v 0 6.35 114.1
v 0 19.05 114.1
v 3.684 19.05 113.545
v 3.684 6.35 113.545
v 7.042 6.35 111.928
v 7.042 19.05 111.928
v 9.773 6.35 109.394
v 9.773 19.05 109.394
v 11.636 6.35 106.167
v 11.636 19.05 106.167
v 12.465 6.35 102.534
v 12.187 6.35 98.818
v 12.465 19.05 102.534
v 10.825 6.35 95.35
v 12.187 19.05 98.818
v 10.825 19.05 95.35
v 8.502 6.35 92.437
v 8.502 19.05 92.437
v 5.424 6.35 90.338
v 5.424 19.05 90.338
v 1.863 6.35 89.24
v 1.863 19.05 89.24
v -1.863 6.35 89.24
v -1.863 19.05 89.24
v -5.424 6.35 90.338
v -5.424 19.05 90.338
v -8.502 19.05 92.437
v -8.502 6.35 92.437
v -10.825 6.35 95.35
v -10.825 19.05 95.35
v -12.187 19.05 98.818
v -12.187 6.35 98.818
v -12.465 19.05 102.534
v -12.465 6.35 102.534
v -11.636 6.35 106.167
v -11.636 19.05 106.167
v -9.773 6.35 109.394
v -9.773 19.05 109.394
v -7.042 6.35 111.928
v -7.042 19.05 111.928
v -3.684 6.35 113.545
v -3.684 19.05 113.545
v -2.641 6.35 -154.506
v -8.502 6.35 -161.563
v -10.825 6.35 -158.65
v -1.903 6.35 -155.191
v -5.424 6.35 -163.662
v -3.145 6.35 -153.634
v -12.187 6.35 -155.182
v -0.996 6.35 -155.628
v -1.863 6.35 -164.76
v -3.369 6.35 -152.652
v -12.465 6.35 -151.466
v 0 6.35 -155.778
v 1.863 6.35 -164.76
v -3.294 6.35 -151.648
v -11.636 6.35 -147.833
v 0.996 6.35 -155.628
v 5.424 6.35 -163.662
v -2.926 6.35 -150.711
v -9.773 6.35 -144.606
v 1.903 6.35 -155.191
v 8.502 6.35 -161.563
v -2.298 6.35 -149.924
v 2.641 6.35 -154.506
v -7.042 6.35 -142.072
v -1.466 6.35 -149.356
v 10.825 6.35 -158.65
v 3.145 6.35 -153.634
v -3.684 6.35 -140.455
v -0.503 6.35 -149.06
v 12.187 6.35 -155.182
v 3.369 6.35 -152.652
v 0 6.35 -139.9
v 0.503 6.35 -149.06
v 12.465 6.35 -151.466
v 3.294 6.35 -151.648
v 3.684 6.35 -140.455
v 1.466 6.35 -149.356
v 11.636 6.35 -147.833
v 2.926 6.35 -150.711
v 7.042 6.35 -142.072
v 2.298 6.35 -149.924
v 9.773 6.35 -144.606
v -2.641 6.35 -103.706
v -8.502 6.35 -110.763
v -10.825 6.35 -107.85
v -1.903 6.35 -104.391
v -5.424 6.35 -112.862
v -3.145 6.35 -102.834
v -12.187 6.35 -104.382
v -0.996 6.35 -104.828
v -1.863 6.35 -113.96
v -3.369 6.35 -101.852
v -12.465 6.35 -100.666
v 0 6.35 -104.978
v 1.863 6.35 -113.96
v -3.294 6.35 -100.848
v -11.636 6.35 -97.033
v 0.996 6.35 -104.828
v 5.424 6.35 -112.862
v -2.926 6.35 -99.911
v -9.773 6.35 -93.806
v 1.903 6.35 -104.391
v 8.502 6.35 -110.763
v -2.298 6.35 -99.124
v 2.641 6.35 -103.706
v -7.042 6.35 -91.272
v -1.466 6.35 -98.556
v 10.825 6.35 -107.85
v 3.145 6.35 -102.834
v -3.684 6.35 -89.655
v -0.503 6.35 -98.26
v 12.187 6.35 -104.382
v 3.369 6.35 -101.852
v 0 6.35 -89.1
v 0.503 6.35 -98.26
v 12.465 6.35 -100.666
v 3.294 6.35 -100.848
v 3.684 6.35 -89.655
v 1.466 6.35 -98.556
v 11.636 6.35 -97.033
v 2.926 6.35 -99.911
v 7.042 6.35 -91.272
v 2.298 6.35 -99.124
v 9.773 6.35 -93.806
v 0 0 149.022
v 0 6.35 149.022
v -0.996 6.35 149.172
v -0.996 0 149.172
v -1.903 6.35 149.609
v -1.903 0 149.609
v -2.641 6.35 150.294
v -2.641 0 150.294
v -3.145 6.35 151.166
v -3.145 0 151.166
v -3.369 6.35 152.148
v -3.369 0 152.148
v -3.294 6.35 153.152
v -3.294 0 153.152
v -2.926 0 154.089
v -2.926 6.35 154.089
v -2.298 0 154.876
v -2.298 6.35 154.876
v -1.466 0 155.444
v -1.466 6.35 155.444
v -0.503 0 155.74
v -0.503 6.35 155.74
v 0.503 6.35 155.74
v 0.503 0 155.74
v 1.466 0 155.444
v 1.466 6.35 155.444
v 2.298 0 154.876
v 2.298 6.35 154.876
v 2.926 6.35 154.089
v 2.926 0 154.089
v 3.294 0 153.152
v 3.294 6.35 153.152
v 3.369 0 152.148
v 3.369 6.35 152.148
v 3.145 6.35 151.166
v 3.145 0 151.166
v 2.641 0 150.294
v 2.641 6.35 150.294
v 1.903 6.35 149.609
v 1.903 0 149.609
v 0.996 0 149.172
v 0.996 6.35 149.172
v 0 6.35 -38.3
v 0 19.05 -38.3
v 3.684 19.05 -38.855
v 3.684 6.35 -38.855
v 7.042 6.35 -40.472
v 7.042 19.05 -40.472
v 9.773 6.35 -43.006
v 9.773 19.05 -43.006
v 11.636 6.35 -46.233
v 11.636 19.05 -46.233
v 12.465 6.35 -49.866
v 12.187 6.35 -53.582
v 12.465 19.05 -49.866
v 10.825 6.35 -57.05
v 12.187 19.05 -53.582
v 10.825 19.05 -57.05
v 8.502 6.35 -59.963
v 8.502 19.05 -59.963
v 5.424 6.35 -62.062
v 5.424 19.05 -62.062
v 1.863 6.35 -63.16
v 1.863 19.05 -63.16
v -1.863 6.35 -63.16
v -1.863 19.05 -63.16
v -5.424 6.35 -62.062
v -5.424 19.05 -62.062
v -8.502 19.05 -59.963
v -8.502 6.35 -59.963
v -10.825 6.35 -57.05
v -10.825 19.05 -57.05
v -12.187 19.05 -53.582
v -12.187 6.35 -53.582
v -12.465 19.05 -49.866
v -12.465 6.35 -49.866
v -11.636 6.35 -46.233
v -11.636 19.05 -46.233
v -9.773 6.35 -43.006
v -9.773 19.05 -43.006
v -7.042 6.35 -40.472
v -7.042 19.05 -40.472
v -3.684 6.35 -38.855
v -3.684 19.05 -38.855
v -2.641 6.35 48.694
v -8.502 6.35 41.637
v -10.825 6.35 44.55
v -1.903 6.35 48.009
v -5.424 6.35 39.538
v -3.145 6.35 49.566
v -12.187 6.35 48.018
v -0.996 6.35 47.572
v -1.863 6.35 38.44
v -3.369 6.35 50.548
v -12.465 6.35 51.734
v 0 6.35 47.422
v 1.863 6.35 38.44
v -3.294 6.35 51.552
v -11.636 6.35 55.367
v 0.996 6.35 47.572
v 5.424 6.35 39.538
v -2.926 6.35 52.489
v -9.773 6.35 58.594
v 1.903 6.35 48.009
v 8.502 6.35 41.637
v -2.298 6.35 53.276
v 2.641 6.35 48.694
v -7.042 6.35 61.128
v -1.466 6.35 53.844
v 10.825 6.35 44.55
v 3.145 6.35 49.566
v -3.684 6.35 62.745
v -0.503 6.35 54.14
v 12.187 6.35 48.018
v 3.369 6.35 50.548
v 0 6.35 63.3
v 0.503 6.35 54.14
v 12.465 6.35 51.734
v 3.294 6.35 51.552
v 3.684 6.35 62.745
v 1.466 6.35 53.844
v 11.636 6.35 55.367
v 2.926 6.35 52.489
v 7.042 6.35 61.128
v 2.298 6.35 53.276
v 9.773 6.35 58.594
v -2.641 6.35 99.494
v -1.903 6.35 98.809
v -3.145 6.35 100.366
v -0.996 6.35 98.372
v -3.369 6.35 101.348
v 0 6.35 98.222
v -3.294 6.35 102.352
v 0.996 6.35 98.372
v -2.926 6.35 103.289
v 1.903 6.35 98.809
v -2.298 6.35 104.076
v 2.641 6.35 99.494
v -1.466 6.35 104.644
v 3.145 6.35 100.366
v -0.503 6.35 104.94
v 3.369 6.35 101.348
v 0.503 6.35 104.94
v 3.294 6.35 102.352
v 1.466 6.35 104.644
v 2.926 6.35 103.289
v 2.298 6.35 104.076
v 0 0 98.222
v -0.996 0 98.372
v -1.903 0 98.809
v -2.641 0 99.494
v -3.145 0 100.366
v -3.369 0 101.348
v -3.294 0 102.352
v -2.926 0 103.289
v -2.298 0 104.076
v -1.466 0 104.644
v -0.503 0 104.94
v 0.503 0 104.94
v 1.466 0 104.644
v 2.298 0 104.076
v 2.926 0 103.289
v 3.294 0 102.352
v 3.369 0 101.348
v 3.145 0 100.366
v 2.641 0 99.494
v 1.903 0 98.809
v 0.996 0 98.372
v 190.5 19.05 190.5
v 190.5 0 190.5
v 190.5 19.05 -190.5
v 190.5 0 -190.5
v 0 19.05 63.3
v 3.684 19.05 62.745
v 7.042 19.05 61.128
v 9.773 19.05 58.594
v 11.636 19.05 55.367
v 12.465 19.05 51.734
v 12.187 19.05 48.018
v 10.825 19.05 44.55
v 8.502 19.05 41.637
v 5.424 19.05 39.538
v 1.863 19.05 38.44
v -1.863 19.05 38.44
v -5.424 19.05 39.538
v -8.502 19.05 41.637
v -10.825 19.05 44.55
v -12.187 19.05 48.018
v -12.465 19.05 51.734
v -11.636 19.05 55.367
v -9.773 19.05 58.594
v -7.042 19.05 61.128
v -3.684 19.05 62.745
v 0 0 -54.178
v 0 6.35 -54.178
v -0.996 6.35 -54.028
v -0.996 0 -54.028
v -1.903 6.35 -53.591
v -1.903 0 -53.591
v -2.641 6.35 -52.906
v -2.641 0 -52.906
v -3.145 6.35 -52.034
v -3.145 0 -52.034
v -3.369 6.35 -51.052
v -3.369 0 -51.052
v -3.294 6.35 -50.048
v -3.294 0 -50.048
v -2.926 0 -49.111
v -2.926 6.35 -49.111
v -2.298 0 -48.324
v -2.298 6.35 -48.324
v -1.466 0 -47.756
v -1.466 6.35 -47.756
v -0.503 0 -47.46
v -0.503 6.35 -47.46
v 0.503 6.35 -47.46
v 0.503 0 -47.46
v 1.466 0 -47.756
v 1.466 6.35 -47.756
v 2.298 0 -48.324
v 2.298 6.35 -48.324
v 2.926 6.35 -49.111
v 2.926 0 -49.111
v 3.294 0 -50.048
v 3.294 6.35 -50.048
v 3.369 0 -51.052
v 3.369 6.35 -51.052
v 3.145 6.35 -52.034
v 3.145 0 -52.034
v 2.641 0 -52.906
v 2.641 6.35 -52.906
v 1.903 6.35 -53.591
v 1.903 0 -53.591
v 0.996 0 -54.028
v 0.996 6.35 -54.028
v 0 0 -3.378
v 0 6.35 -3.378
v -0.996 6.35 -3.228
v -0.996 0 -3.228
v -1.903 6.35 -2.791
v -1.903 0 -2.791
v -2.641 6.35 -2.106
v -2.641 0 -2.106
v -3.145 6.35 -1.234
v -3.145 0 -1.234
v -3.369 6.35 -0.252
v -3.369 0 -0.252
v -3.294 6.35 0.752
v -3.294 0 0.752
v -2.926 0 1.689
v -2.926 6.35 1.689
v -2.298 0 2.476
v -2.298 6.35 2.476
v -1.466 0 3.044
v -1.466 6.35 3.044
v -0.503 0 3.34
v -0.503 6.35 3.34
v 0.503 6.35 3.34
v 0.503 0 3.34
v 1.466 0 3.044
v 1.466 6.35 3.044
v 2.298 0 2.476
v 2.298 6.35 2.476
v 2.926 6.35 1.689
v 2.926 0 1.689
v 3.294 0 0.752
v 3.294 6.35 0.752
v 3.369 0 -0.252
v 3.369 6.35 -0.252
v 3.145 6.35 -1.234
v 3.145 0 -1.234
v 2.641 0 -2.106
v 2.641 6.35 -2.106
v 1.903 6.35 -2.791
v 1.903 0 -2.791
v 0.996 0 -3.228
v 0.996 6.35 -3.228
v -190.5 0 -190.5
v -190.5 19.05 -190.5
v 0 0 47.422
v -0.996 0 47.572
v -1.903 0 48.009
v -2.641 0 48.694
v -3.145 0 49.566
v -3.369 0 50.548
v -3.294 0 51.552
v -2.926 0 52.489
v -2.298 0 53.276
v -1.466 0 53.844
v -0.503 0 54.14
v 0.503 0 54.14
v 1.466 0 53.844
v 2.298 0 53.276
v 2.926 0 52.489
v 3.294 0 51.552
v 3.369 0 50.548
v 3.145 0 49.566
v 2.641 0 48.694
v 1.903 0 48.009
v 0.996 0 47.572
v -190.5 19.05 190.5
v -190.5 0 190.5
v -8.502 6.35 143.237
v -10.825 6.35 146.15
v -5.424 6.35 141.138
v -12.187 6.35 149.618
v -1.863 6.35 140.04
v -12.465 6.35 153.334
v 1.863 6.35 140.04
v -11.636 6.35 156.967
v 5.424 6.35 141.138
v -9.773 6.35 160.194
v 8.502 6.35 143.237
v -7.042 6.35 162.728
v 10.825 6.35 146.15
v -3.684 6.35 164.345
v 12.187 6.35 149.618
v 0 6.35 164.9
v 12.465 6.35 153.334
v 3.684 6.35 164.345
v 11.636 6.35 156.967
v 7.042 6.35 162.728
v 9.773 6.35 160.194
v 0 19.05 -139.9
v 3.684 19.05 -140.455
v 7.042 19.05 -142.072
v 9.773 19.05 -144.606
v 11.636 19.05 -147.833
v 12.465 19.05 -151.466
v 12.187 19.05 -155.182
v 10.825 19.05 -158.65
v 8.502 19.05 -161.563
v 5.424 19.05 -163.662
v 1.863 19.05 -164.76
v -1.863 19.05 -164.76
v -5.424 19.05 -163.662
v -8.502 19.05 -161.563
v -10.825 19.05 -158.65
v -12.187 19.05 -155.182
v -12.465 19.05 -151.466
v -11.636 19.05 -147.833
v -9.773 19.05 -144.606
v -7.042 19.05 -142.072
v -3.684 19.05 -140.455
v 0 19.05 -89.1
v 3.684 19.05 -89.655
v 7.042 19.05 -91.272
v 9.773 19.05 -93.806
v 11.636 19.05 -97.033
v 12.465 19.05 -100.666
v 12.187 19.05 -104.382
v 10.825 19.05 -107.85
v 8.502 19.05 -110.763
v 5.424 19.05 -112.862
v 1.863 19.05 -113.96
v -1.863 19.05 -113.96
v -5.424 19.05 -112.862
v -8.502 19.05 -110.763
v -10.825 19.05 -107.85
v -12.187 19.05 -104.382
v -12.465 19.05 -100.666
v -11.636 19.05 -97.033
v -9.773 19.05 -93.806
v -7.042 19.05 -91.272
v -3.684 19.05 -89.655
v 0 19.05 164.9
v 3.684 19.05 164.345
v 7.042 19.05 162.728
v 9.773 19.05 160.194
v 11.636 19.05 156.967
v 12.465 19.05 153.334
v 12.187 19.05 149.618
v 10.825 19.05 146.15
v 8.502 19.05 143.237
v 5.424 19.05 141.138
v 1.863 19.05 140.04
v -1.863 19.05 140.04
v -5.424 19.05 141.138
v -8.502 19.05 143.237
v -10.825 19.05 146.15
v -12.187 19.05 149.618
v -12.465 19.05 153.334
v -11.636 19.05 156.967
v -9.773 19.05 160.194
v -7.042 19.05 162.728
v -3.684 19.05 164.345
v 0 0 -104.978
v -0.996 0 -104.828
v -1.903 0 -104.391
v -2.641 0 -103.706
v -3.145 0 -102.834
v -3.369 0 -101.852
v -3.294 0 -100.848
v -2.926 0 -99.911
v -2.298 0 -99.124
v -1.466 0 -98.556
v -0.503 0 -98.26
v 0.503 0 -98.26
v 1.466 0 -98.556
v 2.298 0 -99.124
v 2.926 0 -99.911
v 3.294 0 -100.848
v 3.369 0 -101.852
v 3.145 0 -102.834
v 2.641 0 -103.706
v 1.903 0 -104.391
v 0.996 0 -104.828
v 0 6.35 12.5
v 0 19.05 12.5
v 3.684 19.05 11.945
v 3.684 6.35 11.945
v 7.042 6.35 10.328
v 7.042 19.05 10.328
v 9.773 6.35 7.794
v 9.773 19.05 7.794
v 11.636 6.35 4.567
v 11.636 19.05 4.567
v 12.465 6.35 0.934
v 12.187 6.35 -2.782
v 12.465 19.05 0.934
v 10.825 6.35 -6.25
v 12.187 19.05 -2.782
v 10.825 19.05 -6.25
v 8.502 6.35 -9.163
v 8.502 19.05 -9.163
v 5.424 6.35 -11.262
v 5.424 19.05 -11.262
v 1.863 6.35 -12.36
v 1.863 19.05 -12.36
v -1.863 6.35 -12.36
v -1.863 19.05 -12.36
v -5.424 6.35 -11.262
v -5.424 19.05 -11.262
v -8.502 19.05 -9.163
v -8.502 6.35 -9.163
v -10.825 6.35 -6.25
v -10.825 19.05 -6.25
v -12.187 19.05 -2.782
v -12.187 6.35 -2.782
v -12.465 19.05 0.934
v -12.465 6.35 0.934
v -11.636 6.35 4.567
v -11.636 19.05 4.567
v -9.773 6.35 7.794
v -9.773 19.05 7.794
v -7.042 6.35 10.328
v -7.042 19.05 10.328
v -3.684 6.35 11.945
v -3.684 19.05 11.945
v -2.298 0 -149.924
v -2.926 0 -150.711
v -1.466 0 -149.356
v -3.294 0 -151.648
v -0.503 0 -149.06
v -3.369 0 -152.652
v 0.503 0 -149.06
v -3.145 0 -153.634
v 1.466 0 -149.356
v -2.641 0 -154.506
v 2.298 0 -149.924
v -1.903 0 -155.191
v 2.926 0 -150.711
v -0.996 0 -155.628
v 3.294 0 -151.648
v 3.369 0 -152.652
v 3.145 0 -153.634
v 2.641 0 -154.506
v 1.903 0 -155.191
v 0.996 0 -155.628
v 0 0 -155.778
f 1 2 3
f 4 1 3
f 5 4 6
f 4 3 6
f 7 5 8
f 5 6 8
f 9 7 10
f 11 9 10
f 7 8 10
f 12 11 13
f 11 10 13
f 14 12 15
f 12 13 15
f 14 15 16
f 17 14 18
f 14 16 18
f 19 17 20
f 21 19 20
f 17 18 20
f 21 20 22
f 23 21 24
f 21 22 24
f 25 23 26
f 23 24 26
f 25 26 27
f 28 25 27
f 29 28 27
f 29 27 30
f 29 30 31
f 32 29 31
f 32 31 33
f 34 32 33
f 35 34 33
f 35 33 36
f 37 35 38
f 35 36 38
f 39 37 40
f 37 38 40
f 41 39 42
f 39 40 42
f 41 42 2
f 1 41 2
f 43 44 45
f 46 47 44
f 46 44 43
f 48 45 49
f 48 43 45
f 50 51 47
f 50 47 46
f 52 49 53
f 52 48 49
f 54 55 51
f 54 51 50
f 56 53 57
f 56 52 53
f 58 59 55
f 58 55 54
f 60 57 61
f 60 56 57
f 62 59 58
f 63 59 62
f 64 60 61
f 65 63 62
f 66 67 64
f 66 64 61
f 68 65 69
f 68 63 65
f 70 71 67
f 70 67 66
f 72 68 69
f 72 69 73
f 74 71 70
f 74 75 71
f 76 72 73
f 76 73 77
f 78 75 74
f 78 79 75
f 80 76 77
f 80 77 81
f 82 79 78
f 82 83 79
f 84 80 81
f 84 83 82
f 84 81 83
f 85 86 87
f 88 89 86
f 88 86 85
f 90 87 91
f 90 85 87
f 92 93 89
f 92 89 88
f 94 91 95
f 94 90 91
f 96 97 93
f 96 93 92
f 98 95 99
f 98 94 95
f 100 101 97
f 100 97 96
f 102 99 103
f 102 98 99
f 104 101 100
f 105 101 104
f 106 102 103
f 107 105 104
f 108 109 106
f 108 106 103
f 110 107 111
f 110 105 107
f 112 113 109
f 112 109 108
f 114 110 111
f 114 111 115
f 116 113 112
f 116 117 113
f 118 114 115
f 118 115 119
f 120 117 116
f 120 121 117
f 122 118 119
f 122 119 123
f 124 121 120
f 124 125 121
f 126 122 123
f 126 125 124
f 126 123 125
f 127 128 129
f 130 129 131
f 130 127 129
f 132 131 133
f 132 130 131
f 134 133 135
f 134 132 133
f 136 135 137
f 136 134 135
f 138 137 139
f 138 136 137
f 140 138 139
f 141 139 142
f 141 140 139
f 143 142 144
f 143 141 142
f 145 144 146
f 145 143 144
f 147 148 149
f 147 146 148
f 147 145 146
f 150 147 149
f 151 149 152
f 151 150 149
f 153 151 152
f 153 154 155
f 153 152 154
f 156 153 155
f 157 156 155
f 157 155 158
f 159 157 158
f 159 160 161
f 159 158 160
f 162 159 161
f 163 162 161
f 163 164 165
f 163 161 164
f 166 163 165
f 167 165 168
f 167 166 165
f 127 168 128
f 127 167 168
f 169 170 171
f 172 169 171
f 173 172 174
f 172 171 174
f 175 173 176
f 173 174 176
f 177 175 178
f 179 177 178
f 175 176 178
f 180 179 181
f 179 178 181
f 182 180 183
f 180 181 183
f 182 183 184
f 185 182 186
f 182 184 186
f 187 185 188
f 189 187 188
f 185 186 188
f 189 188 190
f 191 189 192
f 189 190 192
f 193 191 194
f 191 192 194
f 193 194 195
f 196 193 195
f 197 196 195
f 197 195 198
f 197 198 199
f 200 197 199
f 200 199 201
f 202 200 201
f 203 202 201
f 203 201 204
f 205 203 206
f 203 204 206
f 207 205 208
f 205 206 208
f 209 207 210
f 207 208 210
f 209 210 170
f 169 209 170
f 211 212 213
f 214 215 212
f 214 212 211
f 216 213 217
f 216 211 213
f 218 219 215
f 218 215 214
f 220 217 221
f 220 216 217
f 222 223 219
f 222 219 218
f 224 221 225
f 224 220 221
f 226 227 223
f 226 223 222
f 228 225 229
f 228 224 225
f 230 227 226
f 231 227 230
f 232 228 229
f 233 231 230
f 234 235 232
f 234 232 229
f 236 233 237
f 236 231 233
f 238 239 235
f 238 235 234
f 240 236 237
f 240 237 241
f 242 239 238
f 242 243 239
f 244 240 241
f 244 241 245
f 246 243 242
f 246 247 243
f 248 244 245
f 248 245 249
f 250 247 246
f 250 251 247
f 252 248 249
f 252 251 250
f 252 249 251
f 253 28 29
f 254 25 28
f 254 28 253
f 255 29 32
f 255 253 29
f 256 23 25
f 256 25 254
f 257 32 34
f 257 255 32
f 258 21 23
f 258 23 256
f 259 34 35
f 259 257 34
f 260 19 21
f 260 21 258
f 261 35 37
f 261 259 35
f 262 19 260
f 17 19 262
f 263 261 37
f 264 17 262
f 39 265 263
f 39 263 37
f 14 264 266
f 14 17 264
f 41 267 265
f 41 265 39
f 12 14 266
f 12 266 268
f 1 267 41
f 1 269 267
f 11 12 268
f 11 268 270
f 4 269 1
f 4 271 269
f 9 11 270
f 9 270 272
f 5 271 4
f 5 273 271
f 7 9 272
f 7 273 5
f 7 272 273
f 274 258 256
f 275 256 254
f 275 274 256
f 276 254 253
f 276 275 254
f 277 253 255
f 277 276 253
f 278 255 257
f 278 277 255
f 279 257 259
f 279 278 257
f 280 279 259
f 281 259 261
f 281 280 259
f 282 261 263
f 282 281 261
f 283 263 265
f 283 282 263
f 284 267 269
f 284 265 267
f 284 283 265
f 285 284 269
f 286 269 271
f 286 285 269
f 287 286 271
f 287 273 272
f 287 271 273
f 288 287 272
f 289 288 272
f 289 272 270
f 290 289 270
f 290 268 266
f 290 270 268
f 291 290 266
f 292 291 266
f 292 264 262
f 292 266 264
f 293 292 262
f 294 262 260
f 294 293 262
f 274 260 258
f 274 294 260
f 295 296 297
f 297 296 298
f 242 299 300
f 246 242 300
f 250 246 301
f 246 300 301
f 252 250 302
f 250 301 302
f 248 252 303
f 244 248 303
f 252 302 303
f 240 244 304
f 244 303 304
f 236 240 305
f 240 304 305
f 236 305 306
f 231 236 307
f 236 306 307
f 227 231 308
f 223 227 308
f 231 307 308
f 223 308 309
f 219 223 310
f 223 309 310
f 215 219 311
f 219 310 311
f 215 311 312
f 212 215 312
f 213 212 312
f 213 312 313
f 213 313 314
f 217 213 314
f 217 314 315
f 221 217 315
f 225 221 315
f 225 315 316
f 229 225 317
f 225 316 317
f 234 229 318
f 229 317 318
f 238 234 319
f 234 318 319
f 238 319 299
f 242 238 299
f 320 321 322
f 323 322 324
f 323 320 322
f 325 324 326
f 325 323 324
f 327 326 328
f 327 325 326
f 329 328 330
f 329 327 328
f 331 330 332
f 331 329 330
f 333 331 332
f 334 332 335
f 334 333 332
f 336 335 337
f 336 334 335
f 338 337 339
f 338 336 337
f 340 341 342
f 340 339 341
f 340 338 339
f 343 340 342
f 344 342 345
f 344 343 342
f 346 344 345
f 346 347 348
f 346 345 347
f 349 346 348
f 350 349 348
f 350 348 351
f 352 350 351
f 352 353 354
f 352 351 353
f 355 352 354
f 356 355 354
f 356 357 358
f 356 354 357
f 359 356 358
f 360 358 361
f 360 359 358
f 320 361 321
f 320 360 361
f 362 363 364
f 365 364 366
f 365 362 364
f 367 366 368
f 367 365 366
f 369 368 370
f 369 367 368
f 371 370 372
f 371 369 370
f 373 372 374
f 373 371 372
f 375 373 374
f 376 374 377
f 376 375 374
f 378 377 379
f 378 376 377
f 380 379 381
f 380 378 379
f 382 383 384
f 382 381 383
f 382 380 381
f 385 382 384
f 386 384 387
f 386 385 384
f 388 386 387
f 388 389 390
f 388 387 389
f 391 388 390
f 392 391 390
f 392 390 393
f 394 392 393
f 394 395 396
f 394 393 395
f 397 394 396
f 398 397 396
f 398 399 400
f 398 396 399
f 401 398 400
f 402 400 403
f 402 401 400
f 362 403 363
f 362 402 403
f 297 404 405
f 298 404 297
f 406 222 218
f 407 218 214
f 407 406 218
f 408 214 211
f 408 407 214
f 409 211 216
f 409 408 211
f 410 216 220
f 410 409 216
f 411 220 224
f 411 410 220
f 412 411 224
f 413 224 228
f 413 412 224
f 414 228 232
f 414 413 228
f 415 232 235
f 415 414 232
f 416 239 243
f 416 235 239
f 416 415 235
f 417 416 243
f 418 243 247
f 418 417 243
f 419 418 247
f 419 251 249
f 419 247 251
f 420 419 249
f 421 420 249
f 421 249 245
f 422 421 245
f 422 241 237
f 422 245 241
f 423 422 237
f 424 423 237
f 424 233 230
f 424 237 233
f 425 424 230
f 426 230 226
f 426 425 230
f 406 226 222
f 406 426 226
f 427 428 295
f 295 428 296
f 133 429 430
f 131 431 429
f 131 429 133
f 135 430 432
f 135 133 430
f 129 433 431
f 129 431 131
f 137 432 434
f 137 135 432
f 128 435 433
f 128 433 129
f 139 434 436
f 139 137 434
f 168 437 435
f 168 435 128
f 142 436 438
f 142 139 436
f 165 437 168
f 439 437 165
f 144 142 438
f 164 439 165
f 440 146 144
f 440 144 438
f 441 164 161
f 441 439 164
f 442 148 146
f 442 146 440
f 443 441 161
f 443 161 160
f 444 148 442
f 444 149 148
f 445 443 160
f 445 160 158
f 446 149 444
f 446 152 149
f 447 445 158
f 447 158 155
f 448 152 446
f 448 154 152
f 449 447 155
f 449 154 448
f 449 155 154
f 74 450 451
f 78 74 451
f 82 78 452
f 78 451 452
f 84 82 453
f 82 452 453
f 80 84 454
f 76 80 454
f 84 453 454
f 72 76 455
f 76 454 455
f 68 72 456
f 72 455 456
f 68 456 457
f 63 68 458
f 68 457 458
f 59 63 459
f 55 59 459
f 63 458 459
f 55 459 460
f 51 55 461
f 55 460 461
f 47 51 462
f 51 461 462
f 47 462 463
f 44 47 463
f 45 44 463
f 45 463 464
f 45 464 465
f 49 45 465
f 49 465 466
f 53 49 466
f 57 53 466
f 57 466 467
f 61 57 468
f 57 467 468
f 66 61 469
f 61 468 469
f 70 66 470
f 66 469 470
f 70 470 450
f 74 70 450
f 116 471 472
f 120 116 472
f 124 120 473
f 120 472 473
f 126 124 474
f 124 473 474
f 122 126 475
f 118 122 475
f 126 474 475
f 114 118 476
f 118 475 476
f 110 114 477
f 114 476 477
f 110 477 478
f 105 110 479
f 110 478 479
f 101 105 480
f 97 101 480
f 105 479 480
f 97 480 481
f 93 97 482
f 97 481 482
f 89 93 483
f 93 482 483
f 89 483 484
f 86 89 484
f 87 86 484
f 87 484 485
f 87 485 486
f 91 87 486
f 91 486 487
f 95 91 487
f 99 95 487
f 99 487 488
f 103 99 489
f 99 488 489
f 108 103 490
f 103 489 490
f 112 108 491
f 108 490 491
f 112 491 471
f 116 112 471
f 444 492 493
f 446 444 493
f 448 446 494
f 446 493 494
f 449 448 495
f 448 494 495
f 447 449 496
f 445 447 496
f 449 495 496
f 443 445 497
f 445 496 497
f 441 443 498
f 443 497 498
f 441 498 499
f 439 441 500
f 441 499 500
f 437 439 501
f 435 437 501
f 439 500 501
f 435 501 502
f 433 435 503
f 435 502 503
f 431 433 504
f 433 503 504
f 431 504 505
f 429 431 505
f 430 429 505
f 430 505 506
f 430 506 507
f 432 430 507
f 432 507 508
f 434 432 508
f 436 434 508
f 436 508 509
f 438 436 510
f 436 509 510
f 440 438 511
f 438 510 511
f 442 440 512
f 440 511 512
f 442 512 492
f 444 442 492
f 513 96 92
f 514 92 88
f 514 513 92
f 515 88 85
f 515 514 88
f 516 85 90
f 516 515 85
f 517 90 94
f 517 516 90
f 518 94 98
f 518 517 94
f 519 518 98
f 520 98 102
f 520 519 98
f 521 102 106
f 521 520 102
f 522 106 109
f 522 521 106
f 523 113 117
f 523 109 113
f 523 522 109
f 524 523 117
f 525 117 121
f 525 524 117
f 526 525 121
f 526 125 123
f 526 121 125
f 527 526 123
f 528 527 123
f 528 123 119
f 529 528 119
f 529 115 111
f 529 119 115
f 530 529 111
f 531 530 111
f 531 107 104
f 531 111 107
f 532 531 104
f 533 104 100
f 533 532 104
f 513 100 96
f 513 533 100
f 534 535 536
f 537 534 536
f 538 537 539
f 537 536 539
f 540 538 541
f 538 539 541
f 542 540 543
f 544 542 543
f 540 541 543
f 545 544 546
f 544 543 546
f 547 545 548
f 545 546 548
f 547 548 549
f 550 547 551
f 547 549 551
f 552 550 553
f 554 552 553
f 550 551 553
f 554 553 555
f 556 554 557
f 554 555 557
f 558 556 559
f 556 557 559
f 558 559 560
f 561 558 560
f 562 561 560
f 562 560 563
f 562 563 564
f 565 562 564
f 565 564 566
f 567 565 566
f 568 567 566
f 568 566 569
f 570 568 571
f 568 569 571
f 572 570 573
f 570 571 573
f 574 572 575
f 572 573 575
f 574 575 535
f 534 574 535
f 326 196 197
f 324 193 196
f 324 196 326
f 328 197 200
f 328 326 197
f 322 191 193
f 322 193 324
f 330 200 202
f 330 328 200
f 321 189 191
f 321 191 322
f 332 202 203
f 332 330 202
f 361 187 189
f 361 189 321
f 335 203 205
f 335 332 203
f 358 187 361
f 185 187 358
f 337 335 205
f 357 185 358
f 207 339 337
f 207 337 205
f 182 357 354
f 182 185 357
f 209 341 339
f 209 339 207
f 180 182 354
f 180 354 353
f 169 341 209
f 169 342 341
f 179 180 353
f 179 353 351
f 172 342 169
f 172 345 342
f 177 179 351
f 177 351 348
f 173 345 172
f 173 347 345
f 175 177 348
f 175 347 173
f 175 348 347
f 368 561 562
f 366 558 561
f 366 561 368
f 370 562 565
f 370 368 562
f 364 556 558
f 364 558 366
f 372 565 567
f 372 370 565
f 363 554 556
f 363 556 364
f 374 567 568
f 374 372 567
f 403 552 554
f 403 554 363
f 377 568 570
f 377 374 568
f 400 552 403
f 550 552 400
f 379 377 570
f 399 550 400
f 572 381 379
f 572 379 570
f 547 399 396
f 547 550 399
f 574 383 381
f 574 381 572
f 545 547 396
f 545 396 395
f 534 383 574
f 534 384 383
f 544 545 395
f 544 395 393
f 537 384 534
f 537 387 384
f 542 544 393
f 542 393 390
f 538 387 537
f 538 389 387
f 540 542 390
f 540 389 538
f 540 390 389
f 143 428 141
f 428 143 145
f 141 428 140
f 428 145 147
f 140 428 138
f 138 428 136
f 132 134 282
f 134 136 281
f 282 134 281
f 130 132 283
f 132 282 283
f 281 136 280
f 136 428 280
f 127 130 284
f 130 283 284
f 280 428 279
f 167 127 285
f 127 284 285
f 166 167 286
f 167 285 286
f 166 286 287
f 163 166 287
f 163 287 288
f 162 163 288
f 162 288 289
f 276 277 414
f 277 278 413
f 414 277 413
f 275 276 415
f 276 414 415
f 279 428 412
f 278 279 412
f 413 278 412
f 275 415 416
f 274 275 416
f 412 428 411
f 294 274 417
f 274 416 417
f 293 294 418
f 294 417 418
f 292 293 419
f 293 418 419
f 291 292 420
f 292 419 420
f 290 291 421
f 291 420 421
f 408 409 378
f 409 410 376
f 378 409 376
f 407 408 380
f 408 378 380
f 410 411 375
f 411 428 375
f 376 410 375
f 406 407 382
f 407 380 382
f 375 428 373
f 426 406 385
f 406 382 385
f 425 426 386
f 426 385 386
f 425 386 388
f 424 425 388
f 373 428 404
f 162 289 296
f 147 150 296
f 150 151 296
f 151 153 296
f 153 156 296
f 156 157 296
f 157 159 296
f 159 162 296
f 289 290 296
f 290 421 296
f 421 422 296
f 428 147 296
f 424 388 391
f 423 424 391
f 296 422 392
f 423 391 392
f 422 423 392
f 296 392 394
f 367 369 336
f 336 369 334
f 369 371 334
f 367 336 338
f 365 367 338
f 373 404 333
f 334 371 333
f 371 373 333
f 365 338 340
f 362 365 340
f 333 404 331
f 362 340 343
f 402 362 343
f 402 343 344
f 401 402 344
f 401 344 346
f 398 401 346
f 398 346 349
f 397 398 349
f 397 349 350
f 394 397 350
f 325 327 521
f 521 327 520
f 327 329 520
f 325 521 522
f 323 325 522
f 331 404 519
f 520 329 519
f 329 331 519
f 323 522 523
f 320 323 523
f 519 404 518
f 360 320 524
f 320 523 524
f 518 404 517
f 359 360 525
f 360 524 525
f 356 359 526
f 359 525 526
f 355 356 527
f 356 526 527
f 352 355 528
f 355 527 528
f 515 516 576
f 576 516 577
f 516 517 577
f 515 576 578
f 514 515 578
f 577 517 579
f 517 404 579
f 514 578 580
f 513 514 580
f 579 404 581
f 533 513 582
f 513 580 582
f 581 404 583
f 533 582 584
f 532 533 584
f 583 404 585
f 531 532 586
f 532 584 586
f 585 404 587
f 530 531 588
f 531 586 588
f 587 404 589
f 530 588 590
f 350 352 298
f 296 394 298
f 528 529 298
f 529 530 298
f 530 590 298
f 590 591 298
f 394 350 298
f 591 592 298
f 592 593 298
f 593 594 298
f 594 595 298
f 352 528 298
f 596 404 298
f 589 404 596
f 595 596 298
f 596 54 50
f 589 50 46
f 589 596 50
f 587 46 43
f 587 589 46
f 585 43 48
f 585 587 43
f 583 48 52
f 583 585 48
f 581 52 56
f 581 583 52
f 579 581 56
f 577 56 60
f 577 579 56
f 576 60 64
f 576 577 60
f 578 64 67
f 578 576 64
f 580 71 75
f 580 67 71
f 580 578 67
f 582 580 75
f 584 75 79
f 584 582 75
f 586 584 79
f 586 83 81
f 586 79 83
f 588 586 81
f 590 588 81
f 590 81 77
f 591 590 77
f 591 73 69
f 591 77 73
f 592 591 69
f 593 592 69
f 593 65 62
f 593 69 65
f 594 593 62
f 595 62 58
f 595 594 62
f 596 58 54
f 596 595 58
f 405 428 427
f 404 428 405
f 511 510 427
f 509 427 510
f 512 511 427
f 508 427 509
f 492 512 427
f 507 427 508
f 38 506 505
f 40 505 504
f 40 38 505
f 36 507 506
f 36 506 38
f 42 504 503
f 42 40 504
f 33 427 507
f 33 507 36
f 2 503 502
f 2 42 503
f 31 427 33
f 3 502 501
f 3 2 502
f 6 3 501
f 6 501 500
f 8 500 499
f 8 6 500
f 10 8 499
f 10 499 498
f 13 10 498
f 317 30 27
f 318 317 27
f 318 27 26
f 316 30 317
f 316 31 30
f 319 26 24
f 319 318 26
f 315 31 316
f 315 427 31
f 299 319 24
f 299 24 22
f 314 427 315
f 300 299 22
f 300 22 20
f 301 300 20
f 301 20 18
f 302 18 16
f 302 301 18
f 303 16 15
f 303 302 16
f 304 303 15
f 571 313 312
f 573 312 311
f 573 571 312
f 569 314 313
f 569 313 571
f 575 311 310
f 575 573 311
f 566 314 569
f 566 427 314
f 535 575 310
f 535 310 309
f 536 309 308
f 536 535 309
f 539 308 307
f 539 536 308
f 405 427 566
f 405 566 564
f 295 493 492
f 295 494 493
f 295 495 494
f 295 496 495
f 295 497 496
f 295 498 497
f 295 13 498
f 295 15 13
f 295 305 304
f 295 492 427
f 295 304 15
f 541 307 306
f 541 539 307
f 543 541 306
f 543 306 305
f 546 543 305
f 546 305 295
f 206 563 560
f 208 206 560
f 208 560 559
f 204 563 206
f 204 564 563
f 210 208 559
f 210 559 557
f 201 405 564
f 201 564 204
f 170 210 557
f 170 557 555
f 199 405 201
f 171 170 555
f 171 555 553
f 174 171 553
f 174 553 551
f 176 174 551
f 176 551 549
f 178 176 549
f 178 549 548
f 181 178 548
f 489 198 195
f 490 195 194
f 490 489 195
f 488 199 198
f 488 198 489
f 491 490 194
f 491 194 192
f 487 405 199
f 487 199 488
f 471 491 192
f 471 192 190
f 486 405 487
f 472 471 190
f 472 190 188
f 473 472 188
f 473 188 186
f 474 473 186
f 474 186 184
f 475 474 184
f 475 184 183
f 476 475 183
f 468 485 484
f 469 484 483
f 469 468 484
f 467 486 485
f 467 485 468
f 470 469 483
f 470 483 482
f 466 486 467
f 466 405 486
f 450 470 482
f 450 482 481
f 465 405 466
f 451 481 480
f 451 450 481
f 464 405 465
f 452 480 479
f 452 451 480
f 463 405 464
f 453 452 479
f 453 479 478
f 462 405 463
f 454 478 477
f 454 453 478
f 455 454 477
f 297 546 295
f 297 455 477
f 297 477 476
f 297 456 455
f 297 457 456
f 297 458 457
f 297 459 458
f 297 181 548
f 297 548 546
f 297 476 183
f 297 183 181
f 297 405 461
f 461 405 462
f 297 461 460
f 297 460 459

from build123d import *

# Parameters (mm, degrees)
SKETCH2_W         = 381
SKETCH2_H         = 381
SKETCH2_R         = 3.3782
BOLT_HOLES_DEPTH  = 19.05
SKETCH3_R         = 12.5
COUNTERBORE_DEPTH = 12.7


with BuildPart() as part:
    # Sketch2 → Bolt Holes (new body)
    with BuildSketch(Plane(origin=(0, 0, 0), x_dir=(1, 0, 0), z_dir=(0, 1, 0))):
        Rectangle(SKETCH2_W, SKETCH2_H)
        with Locations(Location((0, 0, 0), (0, 0, 90))):
            Circle(SKETCH2_R, mode=Mode.SUBTRACT)
        with Locations(Location((0, 50.8, 0), (0, 0, 90))):
            Circle(SKETCH2_R, mode=Mode.SUBTRACT)
        with Locations(Location((0, 101.6, 0), (0, 0, 90))):
            Circle(SKETCH2_R, mode=Mode.SUBTRACT)
        with Locations(Location((0, 152.4, 0), (0, 0, 90))):
            Circle(SKETCH2_R, mode=Mode.SUBTRACT)
        with Locations(Location((0, -50.8, 0), (0, 0, 90))):
            Circle(SKETCH2_R, mode=Mode.SUBTRACT)
        with Locations(Location((0, -101.6, 0), (0, 0, 90))):
            Circle(SKETCH2_R, mode=Mode.SUBTRACT)
        with Locations(Location((0, -152.4, 0), (0, 0, 90))):
            Circle(SKETCH2_R, mode=Mode.SUBTRACT)
    extrude(amount=BOLT_HOLES_DEPTH)

    # Sketch3 → Counterbore (cut)
    with BuildSketch(Plane(origin=(0, 19.05, 0), x_dir=(1, 0, 0), z_dir=(0, 1, 0))):
        with Locations(Location((0, -50.8, 0), (0, 0, 270))):
            Circle(SKETCH3_R)
        with Locations(Location((0, 0, 0), (0, 0, 270))):
            Circle(SKETCH3_R)
        with Locations(Location((0, -101.6, 0), (0, 0, 270))):
            Circle(SKETCH3_R)
        with Locations(Location((0, 50.8, 0), (0, 0, 270))):
            Circle(SKETCH3_R)
        with Locations(Location((0, 101.6, 0), (0, 0, 270))):
            Circle(SKETCH3_R)
        with Locations(Location((0, 152.4, 0), (0, 0, 270))):
            Circle(SKETCH3_R)
        with Locations(Location((0, -152.4, 0), (0, 0, 270))):
            Circle(SKETCH3_R)
    extrude(amount=-COUNTERBORE_DEPTH, mode=Mode.SUBTRACT)


solid = part.part
